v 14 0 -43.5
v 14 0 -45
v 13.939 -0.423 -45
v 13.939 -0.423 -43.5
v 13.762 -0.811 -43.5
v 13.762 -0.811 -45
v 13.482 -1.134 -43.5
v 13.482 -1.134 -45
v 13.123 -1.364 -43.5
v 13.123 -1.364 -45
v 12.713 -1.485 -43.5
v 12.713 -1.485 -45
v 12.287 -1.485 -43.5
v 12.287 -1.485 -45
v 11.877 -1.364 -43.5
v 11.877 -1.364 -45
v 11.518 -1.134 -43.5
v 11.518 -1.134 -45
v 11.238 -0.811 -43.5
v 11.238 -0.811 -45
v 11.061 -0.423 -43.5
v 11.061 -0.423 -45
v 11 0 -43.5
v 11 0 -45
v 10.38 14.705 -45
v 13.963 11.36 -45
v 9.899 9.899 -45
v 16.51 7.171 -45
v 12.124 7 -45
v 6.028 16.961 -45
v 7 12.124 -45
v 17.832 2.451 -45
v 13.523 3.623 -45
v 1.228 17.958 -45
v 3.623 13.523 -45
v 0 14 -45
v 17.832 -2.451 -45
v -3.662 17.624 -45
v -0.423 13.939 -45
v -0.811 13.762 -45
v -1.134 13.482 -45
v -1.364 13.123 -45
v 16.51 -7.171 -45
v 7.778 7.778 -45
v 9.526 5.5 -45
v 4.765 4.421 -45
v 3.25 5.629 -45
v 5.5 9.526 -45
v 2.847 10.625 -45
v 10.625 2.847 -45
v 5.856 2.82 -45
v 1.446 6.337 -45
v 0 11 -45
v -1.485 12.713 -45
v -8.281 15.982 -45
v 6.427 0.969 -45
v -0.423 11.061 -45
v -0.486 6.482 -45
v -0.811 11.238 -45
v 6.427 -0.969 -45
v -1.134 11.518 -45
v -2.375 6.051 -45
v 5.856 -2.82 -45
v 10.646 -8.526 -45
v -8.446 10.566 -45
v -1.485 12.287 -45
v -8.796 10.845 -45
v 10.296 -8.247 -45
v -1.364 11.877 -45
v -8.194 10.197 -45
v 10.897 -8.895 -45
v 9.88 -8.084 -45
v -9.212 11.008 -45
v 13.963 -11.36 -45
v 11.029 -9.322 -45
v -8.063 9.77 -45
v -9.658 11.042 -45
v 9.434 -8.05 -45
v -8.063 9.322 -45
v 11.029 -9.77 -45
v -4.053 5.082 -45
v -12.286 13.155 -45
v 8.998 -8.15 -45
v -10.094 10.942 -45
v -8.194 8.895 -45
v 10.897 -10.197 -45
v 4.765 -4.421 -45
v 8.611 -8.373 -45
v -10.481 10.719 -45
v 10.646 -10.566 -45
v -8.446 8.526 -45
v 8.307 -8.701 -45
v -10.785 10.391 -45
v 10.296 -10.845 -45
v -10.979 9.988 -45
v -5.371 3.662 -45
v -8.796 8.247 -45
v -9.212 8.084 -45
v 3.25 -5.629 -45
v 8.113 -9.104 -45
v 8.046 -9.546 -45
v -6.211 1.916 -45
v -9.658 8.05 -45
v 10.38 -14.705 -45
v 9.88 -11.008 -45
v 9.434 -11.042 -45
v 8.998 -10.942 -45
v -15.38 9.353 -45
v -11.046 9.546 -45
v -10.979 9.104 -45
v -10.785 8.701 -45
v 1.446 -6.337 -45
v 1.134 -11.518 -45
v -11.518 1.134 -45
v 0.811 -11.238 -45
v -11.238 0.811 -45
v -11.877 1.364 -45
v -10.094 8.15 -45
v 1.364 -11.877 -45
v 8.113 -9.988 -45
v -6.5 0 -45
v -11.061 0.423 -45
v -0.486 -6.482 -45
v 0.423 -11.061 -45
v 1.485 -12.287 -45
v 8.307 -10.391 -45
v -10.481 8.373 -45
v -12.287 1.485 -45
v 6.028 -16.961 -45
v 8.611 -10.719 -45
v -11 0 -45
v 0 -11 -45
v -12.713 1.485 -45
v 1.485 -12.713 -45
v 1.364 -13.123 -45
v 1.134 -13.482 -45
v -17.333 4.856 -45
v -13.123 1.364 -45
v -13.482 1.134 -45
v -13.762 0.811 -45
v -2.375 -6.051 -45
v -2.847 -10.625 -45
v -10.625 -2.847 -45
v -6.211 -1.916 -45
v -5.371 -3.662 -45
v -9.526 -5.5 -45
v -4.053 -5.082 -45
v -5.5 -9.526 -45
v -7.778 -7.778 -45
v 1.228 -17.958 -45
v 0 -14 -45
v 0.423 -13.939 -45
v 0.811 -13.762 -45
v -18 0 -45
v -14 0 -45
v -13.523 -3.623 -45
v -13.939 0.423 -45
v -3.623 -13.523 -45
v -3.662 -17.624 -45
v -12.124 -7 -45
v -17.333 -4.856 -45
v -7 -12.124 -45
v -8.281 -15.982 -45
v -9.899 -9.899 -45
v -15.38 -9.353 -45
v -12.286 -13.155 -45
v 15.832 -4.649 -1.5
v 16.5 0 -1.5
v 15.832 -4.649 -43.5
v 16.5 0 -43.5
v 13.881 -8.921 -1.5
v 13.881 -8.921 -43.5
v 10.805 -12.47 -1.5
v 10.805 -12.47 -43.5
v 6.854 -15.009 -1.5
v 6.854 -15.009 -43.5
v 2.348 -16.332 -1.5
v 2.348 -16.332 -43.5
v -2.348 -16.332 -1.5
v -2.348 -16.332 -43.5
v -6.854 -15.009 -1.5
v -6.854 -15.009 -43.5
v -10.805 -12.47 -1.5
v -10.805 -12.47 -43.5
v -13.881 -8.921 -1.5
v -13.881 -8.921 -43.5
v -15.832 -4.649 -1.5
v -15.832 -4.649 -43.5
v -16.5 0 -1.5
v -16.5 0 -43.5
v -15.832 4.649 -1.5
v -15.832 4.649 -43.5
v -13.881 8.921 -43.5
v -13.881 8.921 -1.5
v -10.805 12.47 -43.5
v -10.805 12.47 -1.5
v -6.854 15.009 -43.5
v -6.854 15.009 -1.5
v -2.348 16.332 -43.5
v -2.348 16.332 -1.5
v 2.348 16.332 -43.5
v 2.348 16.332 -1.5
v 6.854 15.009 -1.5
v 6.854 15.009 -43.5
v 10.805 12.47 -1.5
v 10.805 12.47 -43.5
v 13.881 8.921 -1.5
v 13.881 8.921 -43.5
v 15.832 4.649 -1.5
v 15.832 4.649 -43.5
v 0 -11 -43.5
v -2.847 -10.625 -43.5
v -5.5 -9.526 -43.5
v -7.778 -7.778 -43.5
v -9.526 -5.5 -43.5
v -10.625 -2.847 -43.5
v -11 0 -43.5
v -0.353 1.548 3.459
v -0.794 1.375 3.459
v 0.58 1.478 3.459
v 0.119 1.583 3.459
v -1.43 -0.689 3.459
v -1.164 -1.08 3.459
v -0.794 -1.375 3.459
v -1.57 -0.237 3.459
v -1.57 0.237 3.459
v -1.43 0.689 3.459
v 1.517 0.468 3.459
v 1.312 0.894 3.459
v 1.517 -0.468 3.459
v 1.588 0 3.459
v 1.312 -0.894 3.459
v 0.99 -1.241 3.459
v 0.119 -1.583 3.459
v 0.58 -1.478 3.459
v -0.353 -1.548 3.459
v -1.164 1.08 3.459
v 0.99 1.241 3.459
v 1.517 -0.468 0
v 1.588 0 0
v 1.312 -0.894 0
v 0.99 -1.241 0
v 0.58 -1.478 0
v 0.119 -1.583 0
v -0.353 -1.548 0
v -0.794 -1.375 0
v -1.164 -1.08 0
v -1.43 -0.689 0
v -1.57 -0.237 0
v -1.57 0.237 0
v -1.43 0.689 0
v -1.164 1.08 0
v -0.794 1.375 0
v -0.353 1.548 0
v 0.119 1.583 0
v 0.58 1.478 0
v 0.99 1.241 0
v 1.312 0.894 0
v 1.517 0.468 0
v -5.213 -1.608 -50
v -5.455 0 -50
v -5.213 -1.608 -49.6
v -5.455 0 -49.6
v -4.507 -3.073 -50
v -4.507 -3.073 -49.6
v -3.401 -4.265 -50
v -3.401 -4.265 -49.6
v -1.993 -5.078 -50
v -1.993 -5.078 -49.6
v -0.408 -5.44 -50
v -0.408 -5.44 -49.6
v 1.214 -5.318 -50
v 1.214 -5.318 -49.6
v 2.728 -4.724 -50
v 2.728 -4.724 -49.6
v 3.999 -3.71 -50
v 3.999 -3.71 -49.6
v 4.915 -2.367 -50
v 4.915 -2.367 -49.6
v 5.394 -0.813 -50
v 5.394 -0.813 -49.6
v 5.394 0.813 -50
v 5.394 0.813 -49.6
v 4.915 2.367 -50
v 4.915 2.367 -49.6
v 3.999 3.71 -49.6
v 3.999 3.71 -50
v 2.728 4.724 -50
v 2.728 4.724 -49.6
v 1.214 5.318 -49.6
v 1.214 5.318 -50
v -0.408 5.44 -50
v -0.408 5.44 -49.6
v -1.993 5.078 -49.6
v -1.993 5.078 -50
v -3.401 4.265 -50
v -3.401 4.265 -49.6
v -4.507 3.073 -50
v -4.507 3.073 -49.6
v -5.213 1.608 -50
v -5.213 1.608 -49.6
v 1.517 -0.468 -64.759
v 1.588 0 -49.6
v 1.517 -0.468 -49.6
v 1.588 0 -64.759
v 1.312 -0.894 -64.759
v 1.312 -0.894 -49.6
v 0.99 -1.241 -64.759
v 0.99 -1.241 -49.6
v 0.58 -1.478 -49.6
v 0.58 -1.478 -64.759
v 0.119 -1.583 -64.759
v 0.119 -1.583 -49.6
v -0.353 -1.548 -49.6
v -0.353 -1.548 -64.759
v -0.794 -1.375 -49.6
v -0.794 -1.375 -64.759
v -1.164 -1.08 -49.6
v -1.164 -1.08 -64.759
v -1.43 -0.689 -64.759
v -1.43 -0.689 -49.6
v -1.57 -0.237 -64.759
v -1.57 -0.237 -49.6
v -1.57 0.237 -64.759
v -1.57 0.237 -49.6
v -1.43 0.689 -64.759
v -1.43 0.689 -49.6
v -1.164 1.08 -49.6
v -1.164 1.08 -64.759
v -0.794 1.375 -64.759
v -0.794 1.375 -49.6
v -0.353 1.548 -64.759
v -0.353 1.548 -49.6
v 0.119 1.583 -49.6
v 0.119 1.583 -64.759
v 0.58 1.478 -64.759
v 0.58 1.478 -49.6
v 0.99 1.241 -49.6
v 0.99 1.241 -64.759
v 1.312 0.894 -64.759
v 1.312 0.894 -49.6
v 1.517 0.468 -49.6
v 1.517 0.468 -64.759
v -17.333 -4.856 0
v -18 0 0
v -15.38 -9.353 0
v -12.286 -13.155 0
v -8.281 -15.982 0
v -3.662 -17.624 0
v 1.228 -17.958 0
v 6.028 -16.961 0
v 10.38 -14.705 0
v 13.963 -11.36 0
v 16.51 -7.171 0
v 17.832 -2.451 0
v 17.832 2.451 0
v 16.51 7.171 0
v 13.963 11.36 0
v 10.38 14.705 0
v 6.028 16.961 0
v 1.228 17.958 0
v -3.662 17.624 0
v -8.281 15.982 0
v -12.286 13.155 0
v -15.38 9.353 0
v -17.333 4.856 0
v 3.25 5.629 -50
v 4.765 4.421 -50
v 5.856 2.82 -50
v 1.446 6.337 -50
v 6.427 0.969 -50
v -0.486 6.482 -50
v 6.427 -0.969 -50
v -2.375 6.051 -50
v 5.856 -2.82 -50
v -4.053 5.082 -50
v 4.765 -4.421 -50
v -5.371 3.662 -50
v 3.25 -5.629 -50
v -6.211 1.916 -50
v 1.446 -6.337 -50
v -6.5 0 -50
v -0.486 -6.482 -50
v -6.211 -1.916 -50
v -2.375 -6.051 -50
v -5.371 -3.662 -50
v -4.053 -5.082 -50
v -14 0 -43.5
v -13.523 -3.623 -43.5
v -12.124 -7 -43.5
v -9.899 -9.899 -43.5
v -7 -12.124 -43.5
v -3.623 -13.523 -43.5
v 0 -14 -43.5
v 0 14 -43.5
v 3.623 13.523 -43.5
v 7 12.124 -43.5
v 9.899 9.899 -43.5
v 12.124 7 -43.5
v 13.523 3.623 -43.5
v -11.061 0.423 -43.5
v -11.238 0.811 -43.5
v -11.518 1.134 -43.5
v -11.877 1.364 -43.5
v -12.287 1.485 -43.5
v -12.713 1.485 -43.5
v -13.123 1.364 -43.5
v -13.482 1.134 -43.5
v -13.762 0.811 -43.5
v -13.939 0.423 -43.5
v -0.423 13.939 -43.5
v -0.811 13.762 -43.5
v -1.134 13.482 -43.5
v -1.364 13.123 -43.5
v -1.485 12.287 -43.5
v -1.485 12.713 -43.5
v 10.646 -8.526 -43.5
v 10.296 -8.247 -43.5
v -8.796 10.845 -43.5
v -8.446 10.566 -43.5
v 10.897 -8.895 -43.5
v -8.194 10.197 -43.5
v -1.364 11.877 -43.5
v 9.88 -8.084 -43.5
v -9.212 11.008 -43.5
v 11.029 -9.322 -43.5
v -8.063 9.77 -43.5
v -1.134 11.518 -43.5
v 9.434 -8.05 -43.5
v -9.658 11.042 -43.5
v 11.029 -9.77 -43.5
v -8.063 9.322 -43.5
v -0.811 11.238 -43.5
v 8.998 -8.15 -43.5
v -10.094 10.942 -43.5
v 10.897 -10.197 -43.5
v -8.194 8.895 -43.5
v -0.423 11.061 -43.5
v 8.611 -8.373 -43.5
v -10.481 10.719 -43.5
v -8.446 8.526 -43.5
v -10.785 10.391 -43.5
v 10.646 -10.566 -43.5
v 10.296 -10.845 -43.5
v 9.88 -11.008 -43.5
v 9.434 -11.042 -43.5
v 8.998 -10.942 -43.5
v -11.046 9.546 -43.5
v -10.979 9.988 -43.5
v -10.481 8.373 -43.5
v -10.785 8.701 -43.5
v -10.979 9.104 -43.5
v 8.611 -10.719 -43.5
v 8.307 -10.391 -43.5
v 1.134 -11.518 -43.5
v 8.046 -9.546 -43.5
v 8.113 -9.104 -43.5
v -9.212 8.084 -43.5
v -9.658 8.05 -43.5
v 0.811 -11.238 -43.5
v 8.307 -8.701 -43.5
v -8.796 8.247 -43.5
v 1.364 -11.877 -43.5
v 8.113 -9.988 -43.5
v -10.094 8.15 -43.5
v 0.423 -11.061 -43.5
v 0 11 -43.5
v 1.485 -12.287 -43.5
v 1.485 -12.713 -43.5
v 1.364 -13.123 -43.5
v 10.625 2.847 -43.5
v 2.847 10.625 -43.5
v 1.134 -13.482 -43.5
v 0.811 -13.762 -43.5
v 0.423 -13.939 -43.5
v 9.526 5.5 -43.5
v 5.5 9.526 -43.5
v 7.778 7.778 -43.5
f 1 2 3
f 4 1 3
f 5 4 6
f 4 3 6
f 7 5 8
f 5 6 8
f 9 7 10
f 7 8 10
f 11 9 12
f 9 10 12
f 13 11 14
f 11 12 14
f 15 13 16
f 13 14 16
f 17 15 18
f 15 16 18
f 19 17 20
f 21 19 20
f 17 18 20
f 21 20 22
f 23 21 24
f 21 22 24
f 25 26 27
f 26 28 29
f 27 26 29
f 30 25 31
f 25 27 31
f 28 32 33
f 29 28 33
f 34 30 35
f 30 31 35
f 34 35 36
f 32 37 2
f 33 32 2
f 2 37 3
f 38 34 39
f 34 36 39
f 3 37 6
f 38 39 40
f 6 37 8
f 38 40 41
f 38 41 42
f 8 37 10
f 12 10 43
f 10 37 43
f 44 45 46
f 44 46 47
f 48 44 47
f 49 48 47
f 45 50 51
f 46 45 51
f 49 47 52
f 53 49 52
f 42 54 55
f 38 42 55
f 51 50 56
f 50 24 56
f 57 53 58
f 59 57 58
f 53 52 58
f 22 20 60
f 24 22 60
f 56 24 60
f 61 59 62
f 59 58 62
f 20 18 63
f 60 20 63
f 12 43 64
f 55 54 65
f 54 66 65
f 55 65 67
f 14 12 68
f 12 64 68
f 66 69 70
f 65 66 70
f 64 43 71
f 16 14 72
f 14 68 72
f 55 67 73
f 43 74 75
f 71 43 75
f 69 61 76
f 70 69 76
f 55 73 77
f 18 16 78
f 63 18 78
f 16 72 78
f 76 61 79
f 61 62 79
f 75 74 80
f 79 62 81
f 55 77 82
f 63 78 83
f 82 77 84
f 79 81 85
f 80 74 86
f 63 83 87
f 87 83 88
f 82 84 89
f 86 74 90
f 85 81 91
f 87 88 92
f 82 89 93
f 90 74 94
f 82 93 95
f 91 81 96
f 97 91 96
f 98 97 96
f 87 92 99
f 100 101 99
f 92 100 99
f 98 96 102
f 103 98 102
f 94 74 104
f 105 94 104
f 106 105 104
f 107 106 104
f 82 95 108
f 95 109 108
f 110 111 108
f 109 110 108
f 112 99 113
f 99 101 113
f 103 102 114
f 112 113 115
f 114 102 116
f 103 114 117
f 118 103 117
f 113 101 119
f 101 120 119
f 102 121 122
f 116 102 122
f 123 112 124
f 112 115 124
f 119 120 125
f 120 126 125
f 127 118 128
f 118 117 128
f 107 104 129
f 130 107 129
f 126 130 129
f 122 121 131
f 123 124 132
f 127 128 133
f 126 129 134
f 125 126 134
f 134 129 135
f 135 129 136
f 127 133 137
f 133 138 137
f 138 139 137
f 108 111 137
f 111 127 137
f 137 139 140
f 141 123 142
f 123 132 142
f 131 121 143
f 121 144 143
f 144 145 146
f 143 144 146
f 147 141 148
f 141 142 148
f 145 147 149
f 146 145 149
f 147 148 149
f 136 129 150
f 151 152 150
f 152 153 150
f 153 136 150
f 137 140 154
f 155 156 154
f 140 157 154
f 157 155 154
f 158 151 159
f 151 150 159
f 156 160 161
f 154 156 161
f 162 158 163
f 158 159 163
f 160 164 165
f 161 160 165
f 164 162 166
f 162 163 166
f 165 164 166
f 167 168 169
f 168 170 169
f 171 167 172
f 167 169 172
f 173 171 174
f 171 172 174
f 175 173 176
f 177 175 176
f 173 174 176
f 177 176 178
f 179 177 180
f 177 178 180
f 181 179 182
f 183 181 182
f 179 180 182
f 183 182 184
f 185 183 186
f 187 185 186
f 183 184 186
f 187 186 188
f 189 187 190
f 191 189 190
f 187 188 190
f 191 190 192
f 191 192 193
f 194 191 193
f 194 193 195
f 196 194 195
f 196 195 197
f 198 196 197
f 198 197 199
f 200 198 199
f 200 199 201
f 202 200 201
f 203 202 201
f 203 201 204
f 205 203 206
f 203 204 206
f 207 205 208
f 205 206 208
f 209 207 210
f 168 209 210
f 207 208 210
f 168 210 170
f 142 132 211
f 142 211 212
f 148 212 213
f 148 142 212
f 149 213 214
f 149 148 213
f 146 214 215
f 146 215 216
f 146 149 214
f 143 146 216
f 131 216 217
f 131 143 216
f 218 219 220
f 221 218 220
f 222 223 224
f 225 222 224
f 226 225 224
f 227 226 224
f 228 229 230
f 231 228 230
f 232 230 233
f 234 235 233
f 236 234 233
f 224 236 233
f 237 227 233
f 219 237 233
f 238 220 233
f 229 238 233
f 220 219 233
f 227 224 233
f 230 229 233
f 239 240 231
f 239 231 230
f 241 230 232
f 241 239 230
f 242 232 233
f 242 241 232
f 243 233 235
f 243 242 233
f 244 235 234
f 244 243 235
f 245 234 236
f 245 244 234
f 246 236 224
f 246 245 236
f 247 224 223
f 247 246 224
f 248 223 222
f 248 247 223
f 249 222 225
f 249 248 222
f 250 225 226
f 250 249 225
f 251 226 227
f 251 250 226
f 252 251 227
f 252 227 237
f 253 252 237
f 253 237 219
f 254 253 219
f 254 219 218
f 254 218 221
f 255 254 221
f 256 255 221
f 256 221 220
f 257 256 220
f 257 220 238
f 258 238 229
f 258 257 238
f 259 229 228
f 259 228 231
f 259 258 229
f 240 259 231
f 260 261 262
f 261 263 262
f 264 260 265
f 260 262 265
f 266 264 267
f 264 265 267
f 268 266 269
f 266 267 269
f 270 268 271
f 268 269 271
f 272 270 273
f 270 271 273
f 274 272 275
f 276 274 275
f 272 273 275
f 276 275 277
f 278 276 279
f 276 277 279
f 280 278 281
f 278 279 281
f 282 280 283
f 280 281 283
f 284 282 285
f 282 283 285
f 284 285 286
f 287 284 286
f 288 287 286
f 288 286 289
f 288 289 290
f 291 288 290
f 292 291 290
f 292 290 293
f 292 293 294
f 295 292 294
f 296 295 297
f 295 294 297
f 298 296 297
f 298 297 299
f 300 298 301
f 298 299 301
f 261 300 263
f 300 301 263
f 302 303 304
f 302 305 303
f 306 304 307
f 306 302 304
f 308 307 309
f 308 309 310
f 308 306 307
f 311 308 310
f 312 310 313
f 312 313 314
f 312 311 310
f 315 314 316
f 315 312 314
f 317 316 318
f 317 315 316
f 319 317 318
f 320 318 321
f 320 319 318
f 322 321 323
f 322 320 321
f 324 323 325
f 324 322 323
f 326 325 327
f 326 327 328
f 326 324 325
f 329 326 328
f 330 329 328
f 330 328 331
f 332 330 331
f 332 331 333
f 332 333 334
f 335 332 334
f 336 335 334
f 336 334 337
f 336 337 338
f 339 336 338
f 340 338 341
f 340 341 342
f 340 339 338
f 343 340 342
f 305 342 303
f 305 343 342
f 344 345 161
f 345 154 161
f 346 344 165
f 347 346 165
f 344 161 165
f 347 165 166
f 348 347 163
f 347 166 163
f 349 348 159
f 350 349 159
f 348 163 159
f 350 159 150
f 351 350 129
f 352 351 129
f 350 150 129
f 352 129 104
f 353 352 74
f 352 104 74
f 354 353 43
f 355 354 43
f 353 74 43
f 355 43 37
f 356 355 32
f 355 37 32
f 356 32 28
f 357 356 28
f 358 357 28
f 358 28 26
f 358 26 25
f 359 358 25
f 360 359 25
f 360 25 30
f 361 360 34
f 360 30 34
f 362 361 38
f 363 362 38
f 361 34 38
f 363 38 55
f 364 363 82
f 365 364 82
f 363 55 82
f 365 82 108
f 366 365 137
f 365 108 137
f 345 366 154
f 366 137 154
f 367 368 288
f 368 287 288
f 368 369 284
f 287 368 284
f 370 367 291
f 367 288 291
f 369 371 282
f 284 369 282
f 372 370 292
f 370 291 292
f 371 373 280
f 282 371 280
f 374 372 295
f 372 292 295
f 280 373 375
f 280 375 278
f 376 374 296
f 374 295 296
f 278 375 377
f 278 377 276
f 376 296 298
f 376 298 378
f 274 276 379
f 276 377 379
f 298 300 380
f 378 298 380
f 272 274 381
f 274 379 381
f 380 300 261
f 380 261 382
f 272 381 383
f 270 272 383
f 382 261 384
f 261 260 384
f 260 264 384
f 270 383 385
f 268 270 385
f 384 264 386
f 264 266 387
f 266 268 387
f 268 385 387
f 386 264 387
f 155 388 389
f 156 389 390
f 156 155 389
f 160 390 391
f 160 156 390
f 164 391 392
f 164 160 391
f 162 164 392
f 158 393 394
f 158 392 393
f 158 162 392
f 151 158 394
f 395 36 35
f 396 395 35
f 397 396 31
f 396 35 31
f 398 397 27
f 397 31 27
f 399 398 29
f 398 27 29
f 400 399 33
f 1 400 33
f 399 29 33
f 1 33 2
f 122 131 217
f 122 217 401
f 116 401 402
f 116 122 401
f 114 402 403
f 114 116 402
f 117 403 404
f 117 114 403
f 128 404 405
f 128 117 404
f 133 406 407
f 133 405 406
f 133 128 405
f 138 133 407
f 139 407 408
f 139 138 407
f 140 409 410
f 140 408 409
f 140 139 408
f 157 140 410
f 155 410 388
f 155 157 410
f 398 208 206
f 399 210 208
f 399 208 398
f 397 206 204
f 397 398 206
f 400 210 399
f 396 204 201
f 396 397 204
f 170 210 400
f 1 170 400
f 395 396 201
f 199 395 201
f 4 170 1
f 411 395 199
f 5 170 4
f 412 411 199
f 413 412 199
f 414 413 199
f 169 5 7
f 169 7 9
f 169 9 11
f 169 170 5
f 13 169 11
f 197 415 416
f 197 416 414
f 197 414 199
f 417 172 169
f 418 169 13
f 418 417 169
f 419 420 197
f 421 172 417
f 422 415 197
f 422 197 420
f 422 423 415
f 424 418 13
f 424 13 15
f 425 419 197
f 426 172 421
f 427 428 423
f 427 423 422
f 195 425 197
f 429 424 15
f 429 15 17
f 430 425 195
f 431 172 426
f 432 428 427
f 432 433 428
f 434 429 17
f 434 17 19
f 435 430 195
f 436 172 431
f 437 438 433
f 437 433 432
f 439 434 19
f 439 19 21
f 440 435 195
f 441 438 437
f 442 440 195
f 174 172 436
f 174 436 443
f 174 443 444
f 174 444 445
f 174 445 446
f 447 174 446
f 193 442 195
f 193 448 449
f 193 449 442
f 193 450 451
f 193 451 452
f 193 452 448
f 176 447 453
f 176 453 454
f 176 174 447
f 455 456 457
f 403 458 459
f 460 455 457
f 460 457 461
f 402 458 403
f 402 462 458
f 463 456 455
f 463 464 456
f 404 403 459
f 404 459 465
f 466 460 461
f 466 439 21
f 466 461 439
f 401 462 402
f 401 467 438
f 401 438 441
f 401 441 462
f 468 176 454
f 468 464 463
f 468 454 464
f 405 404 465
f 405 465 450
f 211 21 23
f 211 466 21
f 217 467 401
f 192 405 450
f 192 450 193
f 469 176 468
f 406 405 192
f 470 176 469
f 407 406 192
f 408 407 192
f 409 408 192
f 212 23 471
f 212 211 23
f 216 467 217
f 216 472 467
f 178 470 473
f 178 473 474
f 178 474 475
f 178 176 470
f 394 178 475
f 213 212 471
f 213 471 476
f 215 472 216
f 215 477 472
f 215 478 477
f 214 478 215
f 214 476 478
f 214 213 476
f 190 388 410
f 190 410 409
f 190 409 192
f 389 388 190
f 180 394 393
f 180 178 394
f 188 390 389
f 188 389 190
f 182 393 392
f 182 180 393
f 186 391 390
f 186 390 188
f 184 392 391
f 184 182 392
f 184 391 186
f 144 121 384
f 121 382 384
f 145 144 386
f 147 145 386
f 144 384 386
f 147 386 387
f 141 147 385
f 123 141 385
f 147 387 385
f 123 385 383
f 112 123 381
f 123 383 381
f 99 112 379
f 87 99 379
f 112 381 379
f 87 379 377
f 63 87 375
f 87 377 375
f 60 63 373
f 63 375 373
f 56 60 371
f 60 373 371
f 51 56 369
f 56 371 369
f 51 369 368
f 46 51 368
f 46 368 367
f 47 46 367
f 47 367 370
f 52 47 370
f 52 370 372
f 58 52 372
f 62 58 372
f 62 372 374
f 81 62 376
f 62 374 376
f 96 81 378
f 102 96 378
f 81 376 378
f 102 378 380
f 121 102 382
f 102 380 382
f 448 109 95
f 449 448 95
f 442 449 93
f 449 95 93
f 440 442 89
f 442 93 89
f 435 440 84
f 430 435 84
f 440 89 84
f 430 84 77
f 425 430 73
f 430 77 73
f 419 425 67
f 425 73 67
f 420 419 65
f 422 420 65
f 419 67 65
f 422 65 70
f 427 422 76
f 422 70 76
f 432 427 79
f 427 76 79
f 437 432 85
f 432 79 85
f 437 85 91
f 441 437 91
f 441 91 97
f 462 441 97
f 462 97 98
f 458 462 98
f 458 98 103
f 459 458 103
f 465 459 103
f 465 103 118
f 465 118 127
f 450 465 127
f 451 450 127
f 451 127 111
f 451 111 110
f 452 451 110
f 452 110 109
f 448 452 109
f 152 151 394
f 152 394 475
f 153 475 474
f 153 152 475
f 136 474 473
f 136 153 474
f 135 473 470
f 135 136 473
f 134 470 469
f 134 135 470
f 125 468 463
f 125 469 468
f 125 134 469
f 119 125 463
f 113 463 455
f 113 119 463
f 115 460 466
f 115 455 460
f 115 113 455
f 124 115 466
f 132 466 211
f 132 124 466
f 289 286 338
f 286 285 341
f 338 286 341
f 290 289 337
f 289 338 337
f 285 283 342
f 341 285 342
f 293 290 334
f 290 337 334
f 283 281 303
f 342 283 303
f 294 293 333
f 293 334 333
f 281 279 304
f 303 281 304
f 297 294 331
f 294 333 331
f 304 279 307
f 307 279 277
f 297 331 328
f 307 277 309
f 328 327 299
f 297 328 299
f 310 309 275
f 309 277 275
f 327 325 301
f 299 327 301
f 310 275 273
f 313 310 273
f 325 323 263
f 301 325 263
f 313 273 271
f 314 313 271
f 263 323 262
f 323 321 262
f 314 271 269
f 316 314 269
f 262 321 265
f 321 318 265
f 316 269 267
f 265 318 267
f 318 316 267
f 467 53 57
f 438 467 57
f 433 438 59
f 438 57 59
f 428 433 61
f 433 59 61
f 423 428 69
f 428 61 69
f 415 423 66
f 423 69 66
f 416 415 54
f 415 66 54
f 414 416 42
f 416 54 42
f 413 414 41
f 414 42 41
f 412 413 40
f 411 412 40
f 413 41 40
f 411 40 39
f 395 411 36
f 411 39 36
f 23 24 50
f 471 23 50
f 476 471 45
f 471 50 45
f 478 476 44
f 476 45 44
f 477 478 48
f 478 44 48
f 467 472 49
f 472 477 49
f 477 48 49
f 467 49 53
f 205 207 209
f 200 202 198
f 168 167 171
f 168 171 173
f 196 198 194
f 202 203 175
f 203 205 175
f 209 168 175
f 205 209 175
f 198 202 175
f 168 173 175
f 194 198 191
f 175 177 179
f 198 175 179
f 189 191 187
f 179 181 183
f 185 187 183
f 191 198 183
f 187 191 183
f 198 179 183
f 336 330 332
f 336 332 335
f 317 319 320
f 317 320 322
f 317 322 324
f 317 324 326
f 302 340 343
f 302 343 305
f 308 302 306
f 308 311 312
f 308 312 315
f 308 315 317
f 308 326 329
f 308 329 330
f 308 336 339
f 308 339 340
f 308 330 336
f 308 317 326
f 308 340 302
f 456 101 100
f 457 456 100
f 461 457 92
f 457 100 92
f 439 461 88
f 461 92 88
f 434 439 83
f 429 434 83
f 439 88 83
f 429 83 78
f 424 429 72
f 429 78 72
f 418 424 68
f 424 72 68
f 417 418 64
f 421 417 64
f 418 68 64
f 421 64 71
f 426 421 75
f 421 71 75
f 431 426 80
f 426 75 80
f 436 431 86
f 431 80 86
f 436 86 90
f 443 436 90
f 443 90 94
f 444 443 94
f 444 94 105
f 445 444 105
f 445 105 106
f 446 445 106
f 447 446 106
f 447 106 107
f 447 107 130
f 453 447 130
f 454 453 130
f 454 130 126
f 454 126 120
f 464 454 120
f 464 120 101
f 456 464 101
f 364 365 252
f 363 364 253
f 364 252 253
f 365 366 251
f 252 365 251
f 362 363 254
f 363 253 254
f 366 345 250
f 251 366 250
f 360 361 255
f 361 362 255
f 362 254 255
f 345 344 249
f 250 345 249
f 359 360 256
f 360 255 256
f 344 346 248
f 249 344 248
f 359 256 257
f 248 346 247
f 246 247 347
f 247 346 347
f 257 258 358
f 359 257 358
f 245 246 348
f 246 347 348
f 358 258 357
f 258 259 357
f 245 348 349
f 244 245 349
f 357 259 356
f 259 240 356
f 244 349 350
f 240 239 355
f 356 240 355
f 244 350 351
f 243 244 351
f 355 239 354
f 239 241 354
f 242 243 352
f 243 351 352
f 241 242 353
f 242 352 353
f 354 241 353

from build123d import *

# Parameters (mm, degrees)
SKETCH3_W          = 1.5875
SKETCH3_H          = 68.218126879
SKETCH4_W          = 16.5
SKETCH4_H          = 42
CUT_EXTRUDE1_REACH = 56.738
SKETCH5_R          = 1.5


with BuildPart() as part:
    # Sketch2 → Revolve1 (revolve)
    with BuildSketch(Plane(origin=(0, 0, 0), x_dir=(1, 0, 0), z_dir=(0, 1, 0)), mode=Mode.PRIVATE) as revolve1_sk:
        Polygon((0, 0), (18, 0), (18, 45), (6.5, 45), (6.5, 50), (5.455078682, 50), (5.455078682, 49.6), (0, 49.6), align=None)
    revolve(revolve1_sk.sketch.rotate(Axis((0, 0, -54.973870739), (0, 0, 1)), 180), axis=Axis((0, 0, -54.973870739), (0, 0, 1)))

    # Sketch3 → Revolve-Thin1 (revolve)
    with BuildSketch(Plane(origin=(0, 0, 0), x_dir=(1, 0, 0), z_dir=(0, 1, 0)), mode=Mode.PRIVATE) as revolve_thin1_sk:
        with Locations((-0.79375, 30.65040302)):
            Rectangle(SKETCH3_W, SKETCH3_H)
    revolve(revolve_thin1_sk.sketch.rotate(Axis((0, 0, 0), (0, 0, -1)), 180), axis=Axis((0, 0, 0), (0, 0, -1)))

    # Sketch4 → Cut-Revolve2 (revolve, cut)
    with BuildSketch(Plane(origin=(0, 0, 0), x_dir=(1, 0, 0), z_dir=(0, 1, 0))):
        with Locations((8.25, 22.5)):
            Rectangle(SKETCH4_W, SKETCH4_H)
    revolve(axis=Axis((0, 0, 0), (0, 0, -1)), mode=Mode.SUBTRACT)

    # Sketch5 → Cut-Extrude1 (cut, up to next)
    with BuildSketch(Plane(origin=(0, 0, -45), x_dir=(-1, 0, 0), z_dir=(0, 0, -1)), mode=Mode.PRIVATE) as cut_extrude1_sk1:
        with Locations((9.545941546, 9.545941546)):
            Circle(SKETCH5_R)
    cut_extrude1_tool1 = extrude(cut_extrude1_sk1.sketch, amount=-CUT_EXTRUDE1_REACH, mode=Mode.PRIVATE) & part.part
    # Sketch5 → Cut-Extrude1 (cut, up to next)
    with BuildSketch(Plane(origin=(0, 0, -45), x_dir=(-1, 0, 0), z_dir=(0, 0, -1)), mode=Mode.PRIVATE) as cut_extrude1_sk2:
        with Locations((-9.545941546, -9.545941546)):
            Circle(SKETCH5_R)
    cut_extrude1_tool2 = extrude(cut_extrude1_sk2.sketch, amount=-CUT_EXTRUDE1_REACH, mode=Mode.PRIVATE) & part.part
    # Sketch5 → Cut-Extrude1 (cut, up to next)
    with BuildSketch(Plane(origin=(0, 0, -45), x_dir=(-1, 0, 0), z_dir=(0, 0, -1)), mode=Mode.PRIVATE) as cut_extrude1_sk3:
        with BuildLine():
            ThreePointArc((0, 14), (-9.899494937, 9.899494937), (-14, 0))
            ThreePointArc((-14, 0), (-12.5, -1.5), (-11, 0))
            ThreePointArc((-11, 0), (-7.778174593, 7.778174593), (0, 11))
            ThreePointArc((0, 11), (1.5, 12.5), (0, 14))
        make_face()
    cut_extrude1_tool3 = extrude(cut_extrude1_sk3.sketch, amount=-CUT_EXTRUDE1_REACH, mode=Mode.PRIVATE) & part.part
    # Sketch5 → Cut-Extrude1 (cut, up to next)
    with BuildSketch(Plane(origin=(0, 0, -45), x_dir=(-1, 0, 0), z_dir=(0, 0, -1)), mode=Mode.PRIVATE) as cut_extrude1_sk4:
        with BuildLine():
            ThreePointArc((14, 0), (9.899494937, -9.899494937), (0, -14))
            ThreePointArc((0, -14), (-1.5, -12.5), (0, -11))
            ThreePointArc((0, -11), (7.778174593, -7.778174593), (11, 0))
            ThreePointArc((11, 0), (12.5, 1.5), (14, 0))
        make_face()
    cut_extrude1_tool4 = extrude(cut_extrude1_sk4.sketch, amount=-CUT_EXTRUDE1_REACH, mode=Mode.PRIVATE) & part.part
    add(cut_extrude1_tool1.solids().sort_by_distance((-9.545942, 9.545942, -45))[0], mode=Mode.SUBTRACT)
    add(cut_extrude1_tool2.solids().sort_by_distance((9.545942, -9.545942, -45))[0], mode=Mode.SUBTRACT)
    add(cut_extrude1_tool3.solids().sort_by_distance((12.5, -1.280797, -45))[0], mode=Mode.SUBTRACT)
    add(cut_extrude1_tool4.solids().sort_by_distance((-7.933175, -7.933175, -45))[0], mode=Mode.SUBTRACT)


solid = part.part
